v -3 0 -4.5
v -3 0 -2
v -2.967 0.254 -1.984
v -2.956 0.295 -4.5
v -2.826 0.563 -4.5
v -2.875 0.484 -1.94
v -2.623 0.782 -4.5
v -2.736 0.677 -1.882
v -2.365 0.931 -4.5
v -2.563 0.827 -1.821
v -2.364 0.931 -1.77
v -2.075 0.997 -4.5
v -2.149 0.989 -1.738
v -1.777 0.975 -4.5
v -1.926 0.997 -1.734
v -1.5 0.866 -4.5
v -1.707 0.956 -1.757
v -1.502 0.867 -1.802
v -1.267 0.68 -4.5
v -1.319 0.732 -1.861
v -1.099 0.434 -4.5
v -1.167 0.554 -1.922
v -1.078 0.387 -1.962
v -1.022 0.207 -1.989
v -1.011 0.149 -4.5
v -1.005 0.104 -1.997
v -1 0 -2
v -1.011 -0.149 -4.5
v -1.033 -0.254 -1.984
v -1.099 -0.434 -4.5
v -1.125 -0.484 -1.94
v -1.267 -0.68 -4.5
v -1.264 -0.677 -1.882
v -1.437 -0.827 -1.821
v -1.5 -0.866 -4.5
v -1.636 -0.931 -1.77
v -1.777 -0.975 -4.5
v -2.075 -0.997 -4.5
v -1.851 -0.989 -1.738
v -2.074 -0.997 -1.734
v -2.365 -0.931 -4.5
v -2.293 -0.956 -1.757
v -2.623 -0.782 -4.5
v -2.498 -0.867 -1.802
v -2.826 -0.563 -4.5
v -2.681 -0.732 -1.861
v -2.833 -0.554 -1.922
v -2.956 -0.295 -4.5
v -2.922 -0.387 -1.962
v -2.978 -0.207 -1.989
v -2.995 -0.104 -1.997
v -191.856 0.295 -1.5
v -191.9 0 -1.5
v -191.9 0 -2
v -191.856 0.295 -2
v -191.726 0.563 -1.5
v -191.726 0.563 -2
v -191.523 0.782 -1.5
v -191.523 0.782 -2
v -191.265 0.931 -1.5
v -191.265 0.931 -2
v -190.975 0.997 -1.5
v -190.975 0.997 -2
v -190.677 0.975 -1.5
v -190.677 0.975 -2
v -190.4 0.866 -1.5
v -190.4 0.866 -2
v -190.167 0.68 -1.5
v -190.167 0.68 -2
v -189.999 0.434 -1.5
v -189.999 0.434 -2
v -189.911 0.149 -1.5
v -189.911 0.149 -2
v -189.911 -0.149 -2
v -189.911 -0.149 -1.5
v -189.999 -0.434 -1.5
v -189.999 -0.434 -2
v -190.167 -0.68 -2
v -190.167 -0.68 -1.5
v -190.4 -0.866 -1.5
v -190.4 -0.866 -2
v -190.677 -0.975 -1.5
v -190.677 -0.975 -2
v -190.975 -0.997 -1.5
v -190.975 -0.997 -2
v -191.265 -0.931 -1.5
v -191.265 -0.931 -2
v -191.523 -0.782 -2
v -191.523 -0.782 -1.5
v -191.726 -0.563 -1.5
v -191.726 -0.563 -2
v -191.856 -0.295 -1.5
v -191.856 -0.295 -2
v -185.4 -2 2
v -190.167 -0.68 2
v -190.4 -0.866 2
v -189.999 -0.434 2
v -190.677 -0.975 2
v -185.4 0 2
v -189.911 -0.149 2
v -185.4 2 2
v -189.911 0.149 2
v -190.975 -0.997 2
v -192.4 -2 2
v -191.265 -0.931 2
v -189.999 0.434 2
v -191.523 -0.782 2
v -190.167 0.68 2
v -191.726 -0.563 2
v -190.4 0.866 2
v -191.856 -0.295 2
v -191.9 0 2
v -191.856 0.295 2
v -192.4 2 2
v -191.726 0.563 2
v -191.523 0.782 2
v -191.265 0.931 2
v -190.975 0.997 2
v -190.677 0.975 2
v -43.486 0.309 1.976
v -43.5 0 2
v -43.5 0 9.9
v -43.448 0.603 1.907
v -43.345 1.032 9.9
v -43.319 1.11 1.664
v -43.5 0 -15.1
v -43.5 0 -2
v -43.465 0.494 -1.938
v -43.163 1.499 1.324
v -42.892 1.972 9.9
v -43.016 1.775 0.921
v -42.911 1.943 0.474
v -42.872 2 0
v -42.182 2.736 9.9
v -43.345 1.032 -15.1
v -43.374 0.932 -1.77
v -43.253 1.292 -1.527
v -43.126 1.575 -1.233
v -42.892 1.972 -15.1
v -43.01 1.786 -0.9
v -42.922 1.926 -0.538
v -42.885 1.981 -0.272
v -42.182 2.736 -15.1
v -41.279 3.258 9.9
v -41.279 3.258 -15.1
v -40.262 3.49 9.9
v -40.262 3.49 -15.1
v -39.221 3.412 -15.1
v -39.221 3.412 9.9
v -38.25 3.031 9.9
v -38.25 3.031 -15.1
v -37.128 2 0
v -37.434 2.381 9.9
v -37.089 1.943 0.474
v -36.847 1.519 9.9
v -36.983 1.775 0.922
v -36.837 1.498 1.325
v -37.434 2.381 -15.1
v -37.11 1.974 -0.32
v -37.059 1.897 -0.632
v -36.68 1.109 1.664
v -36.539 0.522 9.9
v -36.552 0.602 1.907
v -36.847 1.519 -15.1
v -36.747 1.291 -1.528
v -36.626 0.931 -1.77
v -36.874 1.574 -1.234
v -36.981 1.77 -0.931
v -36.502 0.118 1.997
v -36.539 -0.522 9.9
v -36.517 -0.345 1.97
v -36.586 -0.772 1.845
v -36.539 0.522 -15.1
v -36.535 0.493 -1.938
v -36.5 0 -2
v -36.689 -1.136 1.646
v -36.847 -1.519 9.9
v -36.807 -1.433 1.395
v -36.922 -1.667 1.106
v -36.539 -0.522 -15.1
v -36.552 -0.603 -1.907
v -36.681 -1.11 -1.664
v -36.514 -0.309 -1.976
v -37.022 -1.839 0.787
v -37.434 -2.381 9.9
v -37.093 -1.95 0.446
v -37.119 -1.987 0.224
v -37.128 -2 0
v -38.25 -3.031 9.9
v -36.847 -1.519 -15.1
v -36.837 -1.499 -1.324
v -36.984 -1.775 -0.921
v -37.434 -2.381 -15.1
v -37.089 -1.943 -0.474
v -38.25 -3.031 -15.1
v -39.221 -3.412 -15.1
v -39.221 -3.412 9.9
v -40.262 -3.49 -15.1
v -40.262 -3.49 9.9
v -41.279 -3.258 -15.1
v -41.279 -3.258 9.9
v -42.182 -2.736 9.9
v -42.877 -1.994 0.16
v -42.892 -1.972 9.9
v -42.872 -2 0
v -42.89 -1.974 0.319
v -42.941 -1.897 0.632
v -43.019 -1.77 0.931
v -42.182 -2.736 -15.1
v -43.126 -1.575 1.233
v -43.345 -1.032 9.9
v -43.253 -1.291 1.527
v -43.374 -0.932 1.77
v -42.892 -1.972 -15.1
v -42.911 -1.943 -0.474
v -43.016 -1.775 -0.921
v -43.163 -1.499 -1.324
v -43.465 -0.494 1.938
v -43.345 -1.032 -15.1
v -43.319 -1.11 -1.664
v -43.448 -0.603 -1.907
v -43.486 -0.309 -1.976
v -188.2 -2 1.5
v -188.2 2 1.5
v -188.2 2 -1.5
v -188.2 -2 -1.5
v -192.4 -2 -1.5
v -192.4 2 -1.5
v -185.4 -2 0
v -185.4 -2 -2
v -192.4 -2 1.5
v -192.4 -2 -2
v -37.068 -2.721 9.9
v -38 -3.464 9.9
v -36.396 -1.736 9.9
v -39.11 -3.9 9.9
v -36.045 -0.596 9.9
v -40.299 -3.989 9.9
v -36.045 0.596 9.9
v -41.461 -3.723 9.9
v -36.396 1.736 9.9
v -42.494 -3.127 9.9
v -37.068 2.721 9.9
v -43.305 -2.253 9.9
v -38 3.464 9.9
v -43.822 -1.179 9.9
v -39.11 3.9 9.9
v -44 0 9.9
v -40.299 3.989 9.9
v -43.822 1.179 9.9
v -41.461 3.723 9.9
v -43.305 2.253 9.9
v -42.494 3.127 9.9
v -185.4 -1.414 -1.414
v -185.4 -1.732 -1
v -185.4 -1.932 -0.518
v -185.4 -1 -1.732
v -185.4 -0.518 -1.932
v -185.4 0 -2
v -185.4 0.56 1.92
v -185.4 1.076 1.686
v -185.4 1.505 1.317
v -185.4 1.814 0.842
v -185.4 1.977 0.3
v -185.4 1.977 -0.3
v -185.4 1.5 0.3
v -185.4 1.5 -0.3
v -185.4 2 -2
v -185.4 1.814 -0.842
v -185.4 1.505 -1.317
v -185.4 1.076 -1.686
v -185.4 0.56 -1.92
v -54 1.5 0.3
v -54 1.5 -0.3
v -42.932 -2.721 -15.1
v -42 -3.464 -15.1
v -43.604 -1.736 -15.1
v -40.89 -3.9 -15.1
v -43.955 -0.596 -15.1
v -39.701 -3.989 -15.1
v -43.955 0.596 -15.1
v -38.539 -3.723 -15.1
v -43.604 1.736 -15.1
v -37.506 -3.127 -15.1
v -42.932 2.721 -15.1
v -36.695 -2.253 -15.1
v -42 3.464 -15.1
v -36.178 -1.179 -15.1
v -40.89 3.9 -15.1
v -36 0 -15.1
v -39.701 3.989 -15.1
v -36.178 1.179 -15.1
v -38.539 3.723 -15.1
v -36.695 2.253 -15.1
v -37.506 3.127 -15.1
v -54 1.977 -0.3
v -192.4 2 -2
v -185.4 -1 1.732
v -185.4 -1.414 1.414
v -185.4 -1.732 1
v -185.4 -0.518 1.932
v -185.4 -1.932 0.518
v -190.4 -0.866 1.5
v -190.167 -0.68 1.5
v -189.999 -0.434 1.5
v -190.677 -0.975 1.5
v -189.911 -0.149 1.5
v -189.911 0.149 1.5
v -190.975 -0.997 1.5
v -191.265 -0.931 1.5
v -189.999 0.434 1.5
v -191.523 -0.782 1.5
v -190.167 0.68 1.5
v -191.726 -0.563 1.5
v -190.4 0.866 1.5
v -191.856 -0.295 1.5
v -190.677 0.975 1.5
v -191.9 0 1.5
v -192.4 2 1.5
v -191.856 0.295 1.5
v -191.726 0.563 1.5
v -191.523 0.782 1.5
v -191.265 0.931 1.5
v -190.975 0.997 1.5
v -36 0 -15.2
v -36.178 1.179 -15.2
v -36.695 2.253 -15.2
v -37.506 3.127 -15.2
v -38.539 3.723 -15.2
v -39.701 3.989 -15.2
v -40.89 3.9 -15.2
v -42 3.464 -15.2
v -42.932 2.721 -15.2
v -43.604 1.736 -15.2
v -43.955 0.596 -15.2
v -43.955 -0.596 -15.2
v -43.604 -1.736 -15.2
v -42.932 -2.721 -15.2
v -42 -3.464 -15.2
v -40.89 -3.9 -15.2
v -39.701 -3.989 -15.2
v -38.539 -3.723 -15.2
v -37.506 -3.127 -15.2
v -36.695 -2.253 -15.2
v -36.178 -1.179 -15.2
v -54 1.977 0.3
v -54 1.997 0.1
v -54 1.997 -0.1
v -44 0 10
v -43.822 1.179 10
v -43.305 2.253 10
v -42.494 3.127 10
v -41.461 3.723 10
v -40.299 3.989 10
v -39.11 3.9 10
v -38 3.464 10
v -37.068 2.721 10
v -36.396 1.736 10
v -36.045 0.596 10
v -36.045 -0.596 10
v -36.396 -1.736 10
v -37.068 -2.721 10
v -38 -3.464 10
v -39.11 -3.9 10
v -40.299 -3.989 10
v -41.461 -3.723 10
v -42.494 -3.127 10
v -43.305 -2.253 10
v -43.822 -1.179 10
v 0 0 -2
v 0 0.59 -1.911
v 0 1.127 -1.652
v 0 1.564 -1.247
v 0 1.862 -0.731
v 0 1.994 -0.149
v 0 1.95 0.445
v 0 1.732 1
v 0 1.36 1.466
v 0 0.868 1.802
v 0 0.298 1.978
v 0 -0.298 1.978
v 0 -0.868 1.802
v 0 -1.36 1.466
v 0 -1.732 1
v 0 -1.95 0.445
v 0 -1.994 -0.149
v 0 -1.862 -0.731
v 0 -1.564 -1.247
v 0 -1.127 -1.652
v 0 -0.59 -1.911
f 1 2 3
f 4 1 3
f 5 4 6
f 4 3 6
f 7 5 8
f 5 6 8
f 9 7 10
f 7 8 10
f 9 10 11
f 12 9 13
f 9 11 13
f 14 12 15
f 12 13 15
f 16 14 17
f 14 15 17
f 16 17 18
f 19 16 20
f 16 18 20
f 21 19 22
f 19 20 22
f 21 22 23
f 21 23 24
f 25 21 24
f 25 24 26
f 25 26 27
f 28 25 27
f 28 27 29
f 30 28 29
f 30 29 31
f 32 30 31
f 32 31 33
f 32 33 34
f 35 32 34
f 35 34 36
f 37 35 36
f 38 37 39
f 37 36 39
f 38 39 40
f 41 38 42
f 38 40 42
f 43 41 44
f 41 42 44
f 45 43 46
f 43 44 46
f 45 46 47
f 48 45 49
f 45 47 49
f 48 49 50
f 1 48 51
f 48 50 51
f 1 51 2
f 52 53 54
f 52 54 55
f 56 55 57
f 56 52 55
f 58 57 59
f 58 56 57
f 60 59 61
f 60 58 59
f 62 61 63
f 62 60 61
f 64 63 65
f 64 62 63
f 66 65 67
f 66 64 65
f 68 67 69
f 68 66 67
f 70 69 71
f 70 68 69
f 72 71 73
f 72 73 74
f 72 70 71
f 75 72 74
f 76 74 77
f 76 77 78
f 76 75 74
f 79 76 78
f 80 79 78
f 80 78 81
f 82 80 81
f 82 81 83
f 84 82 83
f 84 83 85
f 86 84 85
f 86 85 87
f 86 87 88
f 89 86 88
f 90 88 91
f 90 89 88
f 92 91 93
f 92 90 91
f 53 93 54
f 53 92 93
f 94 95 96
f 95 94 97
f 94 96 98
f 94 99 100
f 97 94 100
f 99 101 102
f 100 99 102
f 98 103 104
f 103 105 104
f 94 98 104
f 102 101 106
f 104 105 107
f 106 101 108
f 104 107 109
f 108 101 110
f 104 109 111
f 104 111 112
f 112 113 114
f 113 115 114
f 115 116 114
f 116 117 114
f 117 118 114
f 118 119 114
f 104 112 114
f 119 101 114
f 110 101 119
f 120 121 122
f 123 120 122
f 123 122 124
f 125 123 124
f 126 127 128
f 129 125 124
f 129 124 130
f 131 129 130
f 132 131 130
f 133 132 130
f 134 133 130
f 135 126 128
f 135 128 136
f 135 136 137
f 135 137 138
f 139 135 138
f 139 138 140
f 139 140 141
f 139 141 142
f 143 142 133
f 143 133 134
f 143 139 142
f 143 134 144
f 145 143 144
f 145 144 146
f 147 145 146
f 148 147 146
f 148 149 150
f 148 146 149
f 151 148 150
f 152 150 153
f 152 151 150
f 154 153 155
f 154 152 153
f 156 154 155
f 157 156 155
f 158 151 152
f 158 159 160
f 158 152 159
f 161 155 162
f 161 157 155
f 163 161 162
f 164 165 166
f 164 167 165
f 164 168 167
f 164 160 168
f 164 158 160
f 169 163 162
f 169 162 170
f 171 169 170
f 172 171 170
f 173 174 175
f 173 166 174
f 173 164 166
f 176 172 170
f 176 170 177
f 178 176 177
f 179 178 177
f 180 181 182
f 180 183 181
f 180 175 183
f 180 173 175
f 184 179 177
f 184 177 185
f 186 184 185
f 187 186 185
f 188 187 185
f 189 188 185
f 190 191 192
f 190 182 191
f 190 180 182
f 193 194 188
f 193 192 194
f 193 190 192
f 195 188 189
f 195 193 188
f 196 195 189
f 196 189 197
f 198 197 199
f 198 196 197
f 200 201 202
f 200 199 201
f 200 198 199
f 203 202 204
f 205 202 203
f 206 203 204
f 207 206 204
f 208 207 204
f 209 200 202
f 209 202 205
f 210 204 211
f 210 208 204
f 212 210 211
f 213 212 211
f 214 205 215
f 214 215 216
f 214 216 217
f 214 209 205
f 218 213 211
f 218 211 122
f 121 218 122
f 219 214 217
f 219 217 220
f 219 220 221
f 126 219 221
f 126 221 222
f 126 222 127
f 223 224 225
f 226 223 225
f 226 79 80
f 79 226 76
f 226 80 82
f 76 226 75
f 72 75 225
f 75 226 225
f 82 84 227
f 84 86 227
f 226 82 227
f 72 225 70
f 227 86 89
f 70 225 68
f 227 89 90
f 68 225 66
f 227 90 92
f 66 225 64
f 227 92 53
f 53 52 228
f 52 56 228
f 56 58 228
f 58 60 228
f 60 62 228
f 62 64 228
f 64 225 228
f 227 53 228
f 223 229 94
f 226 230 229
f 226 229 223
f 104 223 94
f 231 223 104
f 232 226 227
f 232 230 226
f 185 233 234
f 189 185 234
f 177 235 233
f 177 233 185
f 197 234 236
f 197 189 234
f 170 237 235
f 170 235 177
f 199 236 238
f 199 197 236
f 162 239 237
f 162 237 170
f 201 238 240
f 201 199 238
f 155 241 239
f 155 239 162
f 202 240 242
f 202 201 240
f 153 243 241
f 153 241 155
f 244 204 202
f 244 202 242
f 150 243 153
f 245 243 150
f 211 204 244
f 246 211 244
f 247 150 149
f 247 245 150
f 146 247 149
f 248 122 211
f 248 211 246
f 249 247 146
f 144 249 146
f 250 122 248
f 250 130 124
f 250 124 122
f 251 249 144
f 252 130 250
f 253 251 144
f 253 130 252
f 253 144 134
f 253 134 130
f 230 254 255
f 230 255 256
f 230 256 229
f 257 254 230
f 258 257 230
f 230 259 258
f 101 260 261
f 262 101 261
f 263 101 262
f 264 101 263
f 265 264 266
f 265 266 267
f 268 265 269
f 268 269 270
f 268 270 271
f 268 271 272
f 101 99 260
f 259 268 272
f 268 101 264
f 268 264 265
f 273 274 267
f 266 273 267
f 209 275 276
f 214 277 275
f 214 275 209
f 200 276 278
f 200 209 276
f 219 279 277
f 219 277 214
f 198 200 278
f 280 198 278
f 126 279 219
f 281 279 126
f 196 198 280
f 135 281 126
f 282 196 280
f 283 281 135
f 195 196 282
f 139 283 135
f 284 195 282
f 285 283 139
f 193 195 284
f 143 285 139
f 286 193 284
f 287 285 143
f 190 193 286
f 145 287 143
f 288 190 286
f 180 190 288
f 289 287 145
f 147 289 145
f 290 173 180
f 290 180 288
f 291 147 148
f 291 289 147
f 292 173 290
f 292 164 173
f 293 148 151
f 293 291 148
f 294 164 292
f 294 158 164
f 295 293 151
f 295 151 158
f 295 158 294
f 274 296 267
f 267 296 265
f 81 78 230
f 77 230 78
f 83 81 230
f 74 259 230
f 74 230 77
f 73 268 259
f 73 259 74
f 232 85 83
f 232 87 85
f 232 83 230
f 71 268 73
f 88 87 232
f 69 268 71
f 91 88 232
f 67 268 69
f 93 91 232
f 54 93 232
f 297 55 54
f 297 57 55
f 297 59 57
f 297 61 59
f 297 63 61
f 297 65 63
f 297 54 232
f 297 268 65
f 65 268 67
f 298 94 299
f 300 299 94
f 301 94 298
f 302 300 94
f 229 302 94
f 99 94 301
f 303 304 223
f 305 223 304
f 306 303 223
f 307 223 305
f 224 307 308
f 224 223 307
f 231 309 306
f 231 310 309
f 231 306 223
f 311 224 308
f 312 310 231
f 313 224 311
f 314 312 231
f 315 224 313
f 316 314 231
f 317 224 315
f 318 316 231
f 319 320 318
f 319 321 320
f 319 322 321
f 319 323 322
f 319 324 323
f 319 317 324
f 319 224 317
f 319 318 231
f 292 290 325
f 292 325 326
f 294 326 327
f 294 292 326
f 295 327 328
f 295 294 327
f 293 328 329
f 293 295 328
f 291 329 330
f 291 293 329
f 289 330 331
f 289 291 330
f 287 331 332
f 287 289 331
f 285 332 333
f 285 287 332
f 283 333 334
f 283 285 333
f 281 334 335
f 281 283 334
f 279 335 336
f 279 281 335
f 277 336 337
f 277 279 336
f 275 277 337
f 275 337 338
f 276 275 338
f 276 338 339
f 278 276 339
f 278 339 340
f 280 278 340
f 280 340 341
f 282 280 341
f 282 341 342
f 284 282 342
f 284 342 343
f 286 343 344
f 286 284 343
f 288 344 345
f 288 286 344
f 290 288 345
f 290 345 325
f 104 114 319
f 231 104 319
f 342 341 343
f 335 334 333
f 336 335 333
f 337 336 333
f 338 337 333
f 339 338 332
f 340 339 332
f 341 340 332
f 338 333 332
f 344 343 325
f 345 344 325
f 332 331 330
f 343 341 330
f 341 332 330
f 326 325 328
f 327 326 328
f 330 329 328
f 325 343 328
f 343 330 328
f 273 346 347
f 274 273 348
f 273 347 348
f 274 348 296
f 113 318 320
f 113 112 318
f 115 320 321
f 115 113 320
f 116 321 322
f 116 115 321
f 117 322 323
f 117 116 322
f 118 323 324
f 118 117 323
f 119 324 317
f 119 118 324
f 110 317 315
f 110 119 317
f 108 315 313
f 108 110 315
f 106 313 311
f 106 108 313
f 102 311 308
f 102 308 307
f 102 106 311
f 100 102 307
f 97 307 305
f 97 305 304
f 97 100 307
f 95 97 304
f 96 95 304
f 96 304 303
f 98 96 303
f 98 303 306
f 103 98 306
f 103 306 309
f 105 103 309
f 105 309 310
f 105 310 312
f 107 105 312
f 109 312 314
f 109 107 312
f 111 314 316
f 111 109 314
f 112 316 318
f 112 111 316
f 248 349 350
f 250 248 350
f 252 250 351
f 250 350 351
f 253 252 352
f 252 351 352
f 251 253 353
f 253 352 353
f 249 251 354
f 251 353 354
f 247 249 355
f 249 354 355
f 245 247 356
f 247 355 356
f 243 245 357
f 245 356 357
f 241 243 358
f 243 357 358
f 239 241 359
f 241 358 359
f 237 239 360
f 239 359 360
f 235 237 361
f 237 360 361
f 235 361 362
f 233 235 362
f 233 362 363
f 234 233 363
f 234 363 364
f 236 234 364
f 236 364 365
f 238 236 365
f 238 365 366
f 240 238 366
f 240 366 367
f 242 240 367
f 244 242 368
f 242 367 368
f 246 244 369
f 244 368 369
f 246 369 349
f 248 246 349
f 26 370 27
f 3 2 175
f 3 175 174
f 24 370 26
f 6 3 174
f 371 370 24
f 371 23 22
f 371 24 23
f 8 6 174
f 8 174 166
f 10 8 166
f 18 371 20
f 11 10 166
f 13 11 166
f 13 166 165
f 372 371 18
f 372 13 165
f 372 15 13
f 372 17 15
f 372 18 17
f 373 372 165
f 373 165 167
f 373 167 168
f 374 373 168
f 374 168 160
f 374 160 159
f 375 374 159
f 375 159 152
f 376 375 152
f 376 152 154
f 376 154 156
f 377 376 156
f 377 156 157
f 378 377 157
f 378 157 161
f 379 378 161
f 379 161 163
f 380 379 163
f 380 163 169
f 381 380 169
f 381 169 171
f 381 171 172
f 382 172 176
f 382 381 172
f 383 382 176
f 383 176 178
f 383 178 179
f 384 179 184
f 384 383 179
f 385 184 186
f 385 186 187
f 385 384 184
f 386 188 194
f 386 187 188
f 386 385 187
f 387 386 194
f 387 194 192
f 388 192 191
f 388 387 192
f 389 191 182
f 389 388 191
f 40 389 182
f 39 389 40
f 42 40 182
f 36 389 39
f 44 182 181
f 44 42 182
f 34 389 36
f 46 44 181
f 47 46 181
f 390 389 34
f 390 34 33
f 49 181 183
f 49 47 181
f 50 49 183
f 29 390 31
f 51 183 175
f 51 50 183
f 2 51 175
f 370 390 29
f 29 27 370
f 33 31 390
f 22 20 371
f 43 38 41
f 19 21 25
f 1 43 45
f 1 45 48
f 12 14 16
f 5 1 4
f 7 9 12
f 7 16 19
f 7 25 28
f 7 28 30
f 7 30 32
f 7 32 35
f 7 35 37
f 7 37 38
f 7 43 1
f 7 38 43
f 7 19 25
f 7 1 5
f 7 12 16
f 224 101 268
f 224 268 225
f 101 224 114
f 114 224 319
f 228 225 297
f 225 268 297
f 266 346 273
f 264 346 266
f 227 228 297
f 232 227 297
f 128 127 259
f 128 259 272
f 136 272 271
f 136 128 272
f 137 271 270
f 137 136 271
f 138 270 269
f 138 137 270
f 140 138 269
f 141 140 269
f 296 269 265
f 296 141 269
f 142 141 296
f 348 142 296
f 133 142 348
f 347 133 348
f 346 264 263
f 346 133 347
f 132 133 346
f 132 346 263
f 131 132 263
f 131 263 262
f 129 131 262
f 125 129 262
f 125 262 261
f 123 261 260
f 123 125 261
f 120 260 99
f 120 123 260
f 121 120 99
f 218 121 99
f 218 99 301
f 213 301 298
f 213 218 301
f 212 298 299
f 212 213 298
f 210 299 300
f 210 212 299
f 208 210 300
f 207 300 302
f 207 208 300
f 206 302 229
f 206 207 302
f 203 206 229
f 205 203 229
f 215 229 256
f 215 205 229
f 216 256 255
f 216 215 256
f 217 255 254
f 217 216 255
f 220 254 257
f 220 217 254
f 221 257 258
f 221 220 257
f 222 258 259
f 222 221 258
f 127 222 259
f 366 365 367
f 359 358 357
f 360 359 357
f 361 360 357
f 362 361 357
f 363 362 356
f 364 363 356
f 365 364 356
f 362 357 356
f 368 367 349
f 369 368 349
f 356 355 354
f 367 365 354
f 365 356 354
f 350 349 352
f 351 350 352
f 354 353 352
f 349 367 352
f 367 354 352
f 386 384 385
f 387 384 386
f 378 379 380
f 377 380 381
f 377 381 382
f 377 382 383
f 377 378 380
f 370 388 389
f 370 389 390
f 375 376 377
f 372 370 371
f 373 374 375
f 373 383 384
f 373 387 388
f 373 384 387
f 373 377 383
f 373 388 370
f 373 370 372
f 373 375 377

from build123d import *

# Parameters (mm, degrees)
SKETCH_1_R           = 2
EXTRUDE_1_DEPTH      = 192.4
SKETCH_2_R           = 1
EXTRUDE_2_DEPTH      = 4.5
SKETCH_3_R           = 3.5
EXTRUDE_3_DEPTH      = 10
EXTRUDE_3_DEPTH_BACK = 15.1
SKETCH_4_R           = 4
EXTRUDE_4_DEPTH      = 0.1
SKETCH_5_R           = 4
EXTRUDE_5_DEPTH      = 0.1
SKETCH_6_W           = 7
SKETCH_6_H           = 4
EXTRUDE_6_DEPTH      = 2
SKETCH_7_W           = 4.2
SKETCH_7_H           = 3
CUT_EXTRUDE_1_DEPTH  = 2
SKETCH_8_R           = 1
CUT_EXTRUDE_2_DEPTH  = 2
SKETCH_9_W           = 131.4
SKETCH_9_H           = 0.6
CUT_EXTRUDE_3_DEPTH  = 0.5


with BuildPart() as part:
    # 草图1 → 凸台-拉伸1 (new body)
    with BuildSketch(Plane(origin=(0, 0, 0), x_dir=(0, 0, -1), z_dir=(1, 0, 0))):
        Circle(SKETCH_1_R)
    extrude(amount=EXTRUDE_1_DEPTH)

    # 草图2 → 凸台-拉伸2 (add)
    with BuildSketch(Plane.XY):
        with Locations((2, 0)):
            Circle(SKETCH_2_R)
    extrude(amount=-EXTRUDE_2_DEPTH)

    # 草图3 → 凸台-拉伸3 (add, two sides)
    with BuildSketch(Plane.XY) as extrude_3_sk:
        with Locations((40, 0)):
            Circle(SKETCH_3_R)
    extrude(amount=EXTRUDE_3_DEPTH)
    extrude(extrude_3_sk.sketch, amount=-EXTRUDE_3_DEPTH_BACK)

    # 草图4 → 凸台-拉伸4 (add)
    with BuildSketch(Plane.XY.offset(10)):
        with Locations((40, 0)):
            Circle(SKETCH_4_R)
    extrude(amount=-EXTRUDE_4_DEPTH)

    # 草图5 → 凸台-拉伸5 (add)
    with BuildSketch(Plane(origin=(0, 0, -15.1), x_dir=(-1, 0, 0), z_dir=(0, 0, -1))):
        with Locations((-40, 0)):
            Circle(SKETCH_5_R)
    extrude(amount=EXTRUDE_5_DEPTH)

    # 草图6 → 凸台-拉伸6 (add, symmetric)
    with BuildSketch(Plane(origin=(0, 0, 0), x_dir=(1, 0, 0), z_dir=(0, 1, 0))):
        with Locations((188.9, 0)):
            Rectangle(SKETCH_6_W, SKETCH_6_H)
    extrude(amount=EXTRUDE_6_DEPTH, both=True)

    # 草图7 → 切除-拉伸1 (cut, symmetric)
    with BuildSketch(Plane(origin=(0, 0, 0), x_dir=(1, 0, 0), z_dir=(0, 1, 0))):
        with Locations((190.3, 0)):
            Rectangle(SKETCH_7_W, SKETCH_7_H)
    extrude(amount=CUT_EXTRUDE_1_DEPTH, both=True, mode=Mode.SUBTRACT)

    # 草图8 → 切除-拉伸2 (cut, symmetric)
    with BuildSketch(Plane.XY):
        with Locations((190.9, 0)):
            Circle(SKETCH_8_R)
    extrude(amount=CUT_EXTRUDE_2_DEPTH, both=True, mode=Mode.SUBTRACT)

    # 草图9 → 切除-拉伸3 (cut)
    with BuildSketch(Plane(origin=(0, 2, 0), x_dir=(1, 0, 0), z_dir=(0, 1, 0))):
        with Locations((119.7, 0)):
            Rectangle(SKETCH_9_W, SKETCH_9_H)
    extrude(amount=-CUT_EXTRUDE_3_DEPTH, mode=Mode.SUBTRACT)


with BuildPart() as body_2:
    # 镜向1: mirrored copy
    add(part.part.mirror(Plane(origin=(0, 0, 0), x_dir=(0, 0, 1), z_dir=(1, 0, 0))))


solid = body_2.part
